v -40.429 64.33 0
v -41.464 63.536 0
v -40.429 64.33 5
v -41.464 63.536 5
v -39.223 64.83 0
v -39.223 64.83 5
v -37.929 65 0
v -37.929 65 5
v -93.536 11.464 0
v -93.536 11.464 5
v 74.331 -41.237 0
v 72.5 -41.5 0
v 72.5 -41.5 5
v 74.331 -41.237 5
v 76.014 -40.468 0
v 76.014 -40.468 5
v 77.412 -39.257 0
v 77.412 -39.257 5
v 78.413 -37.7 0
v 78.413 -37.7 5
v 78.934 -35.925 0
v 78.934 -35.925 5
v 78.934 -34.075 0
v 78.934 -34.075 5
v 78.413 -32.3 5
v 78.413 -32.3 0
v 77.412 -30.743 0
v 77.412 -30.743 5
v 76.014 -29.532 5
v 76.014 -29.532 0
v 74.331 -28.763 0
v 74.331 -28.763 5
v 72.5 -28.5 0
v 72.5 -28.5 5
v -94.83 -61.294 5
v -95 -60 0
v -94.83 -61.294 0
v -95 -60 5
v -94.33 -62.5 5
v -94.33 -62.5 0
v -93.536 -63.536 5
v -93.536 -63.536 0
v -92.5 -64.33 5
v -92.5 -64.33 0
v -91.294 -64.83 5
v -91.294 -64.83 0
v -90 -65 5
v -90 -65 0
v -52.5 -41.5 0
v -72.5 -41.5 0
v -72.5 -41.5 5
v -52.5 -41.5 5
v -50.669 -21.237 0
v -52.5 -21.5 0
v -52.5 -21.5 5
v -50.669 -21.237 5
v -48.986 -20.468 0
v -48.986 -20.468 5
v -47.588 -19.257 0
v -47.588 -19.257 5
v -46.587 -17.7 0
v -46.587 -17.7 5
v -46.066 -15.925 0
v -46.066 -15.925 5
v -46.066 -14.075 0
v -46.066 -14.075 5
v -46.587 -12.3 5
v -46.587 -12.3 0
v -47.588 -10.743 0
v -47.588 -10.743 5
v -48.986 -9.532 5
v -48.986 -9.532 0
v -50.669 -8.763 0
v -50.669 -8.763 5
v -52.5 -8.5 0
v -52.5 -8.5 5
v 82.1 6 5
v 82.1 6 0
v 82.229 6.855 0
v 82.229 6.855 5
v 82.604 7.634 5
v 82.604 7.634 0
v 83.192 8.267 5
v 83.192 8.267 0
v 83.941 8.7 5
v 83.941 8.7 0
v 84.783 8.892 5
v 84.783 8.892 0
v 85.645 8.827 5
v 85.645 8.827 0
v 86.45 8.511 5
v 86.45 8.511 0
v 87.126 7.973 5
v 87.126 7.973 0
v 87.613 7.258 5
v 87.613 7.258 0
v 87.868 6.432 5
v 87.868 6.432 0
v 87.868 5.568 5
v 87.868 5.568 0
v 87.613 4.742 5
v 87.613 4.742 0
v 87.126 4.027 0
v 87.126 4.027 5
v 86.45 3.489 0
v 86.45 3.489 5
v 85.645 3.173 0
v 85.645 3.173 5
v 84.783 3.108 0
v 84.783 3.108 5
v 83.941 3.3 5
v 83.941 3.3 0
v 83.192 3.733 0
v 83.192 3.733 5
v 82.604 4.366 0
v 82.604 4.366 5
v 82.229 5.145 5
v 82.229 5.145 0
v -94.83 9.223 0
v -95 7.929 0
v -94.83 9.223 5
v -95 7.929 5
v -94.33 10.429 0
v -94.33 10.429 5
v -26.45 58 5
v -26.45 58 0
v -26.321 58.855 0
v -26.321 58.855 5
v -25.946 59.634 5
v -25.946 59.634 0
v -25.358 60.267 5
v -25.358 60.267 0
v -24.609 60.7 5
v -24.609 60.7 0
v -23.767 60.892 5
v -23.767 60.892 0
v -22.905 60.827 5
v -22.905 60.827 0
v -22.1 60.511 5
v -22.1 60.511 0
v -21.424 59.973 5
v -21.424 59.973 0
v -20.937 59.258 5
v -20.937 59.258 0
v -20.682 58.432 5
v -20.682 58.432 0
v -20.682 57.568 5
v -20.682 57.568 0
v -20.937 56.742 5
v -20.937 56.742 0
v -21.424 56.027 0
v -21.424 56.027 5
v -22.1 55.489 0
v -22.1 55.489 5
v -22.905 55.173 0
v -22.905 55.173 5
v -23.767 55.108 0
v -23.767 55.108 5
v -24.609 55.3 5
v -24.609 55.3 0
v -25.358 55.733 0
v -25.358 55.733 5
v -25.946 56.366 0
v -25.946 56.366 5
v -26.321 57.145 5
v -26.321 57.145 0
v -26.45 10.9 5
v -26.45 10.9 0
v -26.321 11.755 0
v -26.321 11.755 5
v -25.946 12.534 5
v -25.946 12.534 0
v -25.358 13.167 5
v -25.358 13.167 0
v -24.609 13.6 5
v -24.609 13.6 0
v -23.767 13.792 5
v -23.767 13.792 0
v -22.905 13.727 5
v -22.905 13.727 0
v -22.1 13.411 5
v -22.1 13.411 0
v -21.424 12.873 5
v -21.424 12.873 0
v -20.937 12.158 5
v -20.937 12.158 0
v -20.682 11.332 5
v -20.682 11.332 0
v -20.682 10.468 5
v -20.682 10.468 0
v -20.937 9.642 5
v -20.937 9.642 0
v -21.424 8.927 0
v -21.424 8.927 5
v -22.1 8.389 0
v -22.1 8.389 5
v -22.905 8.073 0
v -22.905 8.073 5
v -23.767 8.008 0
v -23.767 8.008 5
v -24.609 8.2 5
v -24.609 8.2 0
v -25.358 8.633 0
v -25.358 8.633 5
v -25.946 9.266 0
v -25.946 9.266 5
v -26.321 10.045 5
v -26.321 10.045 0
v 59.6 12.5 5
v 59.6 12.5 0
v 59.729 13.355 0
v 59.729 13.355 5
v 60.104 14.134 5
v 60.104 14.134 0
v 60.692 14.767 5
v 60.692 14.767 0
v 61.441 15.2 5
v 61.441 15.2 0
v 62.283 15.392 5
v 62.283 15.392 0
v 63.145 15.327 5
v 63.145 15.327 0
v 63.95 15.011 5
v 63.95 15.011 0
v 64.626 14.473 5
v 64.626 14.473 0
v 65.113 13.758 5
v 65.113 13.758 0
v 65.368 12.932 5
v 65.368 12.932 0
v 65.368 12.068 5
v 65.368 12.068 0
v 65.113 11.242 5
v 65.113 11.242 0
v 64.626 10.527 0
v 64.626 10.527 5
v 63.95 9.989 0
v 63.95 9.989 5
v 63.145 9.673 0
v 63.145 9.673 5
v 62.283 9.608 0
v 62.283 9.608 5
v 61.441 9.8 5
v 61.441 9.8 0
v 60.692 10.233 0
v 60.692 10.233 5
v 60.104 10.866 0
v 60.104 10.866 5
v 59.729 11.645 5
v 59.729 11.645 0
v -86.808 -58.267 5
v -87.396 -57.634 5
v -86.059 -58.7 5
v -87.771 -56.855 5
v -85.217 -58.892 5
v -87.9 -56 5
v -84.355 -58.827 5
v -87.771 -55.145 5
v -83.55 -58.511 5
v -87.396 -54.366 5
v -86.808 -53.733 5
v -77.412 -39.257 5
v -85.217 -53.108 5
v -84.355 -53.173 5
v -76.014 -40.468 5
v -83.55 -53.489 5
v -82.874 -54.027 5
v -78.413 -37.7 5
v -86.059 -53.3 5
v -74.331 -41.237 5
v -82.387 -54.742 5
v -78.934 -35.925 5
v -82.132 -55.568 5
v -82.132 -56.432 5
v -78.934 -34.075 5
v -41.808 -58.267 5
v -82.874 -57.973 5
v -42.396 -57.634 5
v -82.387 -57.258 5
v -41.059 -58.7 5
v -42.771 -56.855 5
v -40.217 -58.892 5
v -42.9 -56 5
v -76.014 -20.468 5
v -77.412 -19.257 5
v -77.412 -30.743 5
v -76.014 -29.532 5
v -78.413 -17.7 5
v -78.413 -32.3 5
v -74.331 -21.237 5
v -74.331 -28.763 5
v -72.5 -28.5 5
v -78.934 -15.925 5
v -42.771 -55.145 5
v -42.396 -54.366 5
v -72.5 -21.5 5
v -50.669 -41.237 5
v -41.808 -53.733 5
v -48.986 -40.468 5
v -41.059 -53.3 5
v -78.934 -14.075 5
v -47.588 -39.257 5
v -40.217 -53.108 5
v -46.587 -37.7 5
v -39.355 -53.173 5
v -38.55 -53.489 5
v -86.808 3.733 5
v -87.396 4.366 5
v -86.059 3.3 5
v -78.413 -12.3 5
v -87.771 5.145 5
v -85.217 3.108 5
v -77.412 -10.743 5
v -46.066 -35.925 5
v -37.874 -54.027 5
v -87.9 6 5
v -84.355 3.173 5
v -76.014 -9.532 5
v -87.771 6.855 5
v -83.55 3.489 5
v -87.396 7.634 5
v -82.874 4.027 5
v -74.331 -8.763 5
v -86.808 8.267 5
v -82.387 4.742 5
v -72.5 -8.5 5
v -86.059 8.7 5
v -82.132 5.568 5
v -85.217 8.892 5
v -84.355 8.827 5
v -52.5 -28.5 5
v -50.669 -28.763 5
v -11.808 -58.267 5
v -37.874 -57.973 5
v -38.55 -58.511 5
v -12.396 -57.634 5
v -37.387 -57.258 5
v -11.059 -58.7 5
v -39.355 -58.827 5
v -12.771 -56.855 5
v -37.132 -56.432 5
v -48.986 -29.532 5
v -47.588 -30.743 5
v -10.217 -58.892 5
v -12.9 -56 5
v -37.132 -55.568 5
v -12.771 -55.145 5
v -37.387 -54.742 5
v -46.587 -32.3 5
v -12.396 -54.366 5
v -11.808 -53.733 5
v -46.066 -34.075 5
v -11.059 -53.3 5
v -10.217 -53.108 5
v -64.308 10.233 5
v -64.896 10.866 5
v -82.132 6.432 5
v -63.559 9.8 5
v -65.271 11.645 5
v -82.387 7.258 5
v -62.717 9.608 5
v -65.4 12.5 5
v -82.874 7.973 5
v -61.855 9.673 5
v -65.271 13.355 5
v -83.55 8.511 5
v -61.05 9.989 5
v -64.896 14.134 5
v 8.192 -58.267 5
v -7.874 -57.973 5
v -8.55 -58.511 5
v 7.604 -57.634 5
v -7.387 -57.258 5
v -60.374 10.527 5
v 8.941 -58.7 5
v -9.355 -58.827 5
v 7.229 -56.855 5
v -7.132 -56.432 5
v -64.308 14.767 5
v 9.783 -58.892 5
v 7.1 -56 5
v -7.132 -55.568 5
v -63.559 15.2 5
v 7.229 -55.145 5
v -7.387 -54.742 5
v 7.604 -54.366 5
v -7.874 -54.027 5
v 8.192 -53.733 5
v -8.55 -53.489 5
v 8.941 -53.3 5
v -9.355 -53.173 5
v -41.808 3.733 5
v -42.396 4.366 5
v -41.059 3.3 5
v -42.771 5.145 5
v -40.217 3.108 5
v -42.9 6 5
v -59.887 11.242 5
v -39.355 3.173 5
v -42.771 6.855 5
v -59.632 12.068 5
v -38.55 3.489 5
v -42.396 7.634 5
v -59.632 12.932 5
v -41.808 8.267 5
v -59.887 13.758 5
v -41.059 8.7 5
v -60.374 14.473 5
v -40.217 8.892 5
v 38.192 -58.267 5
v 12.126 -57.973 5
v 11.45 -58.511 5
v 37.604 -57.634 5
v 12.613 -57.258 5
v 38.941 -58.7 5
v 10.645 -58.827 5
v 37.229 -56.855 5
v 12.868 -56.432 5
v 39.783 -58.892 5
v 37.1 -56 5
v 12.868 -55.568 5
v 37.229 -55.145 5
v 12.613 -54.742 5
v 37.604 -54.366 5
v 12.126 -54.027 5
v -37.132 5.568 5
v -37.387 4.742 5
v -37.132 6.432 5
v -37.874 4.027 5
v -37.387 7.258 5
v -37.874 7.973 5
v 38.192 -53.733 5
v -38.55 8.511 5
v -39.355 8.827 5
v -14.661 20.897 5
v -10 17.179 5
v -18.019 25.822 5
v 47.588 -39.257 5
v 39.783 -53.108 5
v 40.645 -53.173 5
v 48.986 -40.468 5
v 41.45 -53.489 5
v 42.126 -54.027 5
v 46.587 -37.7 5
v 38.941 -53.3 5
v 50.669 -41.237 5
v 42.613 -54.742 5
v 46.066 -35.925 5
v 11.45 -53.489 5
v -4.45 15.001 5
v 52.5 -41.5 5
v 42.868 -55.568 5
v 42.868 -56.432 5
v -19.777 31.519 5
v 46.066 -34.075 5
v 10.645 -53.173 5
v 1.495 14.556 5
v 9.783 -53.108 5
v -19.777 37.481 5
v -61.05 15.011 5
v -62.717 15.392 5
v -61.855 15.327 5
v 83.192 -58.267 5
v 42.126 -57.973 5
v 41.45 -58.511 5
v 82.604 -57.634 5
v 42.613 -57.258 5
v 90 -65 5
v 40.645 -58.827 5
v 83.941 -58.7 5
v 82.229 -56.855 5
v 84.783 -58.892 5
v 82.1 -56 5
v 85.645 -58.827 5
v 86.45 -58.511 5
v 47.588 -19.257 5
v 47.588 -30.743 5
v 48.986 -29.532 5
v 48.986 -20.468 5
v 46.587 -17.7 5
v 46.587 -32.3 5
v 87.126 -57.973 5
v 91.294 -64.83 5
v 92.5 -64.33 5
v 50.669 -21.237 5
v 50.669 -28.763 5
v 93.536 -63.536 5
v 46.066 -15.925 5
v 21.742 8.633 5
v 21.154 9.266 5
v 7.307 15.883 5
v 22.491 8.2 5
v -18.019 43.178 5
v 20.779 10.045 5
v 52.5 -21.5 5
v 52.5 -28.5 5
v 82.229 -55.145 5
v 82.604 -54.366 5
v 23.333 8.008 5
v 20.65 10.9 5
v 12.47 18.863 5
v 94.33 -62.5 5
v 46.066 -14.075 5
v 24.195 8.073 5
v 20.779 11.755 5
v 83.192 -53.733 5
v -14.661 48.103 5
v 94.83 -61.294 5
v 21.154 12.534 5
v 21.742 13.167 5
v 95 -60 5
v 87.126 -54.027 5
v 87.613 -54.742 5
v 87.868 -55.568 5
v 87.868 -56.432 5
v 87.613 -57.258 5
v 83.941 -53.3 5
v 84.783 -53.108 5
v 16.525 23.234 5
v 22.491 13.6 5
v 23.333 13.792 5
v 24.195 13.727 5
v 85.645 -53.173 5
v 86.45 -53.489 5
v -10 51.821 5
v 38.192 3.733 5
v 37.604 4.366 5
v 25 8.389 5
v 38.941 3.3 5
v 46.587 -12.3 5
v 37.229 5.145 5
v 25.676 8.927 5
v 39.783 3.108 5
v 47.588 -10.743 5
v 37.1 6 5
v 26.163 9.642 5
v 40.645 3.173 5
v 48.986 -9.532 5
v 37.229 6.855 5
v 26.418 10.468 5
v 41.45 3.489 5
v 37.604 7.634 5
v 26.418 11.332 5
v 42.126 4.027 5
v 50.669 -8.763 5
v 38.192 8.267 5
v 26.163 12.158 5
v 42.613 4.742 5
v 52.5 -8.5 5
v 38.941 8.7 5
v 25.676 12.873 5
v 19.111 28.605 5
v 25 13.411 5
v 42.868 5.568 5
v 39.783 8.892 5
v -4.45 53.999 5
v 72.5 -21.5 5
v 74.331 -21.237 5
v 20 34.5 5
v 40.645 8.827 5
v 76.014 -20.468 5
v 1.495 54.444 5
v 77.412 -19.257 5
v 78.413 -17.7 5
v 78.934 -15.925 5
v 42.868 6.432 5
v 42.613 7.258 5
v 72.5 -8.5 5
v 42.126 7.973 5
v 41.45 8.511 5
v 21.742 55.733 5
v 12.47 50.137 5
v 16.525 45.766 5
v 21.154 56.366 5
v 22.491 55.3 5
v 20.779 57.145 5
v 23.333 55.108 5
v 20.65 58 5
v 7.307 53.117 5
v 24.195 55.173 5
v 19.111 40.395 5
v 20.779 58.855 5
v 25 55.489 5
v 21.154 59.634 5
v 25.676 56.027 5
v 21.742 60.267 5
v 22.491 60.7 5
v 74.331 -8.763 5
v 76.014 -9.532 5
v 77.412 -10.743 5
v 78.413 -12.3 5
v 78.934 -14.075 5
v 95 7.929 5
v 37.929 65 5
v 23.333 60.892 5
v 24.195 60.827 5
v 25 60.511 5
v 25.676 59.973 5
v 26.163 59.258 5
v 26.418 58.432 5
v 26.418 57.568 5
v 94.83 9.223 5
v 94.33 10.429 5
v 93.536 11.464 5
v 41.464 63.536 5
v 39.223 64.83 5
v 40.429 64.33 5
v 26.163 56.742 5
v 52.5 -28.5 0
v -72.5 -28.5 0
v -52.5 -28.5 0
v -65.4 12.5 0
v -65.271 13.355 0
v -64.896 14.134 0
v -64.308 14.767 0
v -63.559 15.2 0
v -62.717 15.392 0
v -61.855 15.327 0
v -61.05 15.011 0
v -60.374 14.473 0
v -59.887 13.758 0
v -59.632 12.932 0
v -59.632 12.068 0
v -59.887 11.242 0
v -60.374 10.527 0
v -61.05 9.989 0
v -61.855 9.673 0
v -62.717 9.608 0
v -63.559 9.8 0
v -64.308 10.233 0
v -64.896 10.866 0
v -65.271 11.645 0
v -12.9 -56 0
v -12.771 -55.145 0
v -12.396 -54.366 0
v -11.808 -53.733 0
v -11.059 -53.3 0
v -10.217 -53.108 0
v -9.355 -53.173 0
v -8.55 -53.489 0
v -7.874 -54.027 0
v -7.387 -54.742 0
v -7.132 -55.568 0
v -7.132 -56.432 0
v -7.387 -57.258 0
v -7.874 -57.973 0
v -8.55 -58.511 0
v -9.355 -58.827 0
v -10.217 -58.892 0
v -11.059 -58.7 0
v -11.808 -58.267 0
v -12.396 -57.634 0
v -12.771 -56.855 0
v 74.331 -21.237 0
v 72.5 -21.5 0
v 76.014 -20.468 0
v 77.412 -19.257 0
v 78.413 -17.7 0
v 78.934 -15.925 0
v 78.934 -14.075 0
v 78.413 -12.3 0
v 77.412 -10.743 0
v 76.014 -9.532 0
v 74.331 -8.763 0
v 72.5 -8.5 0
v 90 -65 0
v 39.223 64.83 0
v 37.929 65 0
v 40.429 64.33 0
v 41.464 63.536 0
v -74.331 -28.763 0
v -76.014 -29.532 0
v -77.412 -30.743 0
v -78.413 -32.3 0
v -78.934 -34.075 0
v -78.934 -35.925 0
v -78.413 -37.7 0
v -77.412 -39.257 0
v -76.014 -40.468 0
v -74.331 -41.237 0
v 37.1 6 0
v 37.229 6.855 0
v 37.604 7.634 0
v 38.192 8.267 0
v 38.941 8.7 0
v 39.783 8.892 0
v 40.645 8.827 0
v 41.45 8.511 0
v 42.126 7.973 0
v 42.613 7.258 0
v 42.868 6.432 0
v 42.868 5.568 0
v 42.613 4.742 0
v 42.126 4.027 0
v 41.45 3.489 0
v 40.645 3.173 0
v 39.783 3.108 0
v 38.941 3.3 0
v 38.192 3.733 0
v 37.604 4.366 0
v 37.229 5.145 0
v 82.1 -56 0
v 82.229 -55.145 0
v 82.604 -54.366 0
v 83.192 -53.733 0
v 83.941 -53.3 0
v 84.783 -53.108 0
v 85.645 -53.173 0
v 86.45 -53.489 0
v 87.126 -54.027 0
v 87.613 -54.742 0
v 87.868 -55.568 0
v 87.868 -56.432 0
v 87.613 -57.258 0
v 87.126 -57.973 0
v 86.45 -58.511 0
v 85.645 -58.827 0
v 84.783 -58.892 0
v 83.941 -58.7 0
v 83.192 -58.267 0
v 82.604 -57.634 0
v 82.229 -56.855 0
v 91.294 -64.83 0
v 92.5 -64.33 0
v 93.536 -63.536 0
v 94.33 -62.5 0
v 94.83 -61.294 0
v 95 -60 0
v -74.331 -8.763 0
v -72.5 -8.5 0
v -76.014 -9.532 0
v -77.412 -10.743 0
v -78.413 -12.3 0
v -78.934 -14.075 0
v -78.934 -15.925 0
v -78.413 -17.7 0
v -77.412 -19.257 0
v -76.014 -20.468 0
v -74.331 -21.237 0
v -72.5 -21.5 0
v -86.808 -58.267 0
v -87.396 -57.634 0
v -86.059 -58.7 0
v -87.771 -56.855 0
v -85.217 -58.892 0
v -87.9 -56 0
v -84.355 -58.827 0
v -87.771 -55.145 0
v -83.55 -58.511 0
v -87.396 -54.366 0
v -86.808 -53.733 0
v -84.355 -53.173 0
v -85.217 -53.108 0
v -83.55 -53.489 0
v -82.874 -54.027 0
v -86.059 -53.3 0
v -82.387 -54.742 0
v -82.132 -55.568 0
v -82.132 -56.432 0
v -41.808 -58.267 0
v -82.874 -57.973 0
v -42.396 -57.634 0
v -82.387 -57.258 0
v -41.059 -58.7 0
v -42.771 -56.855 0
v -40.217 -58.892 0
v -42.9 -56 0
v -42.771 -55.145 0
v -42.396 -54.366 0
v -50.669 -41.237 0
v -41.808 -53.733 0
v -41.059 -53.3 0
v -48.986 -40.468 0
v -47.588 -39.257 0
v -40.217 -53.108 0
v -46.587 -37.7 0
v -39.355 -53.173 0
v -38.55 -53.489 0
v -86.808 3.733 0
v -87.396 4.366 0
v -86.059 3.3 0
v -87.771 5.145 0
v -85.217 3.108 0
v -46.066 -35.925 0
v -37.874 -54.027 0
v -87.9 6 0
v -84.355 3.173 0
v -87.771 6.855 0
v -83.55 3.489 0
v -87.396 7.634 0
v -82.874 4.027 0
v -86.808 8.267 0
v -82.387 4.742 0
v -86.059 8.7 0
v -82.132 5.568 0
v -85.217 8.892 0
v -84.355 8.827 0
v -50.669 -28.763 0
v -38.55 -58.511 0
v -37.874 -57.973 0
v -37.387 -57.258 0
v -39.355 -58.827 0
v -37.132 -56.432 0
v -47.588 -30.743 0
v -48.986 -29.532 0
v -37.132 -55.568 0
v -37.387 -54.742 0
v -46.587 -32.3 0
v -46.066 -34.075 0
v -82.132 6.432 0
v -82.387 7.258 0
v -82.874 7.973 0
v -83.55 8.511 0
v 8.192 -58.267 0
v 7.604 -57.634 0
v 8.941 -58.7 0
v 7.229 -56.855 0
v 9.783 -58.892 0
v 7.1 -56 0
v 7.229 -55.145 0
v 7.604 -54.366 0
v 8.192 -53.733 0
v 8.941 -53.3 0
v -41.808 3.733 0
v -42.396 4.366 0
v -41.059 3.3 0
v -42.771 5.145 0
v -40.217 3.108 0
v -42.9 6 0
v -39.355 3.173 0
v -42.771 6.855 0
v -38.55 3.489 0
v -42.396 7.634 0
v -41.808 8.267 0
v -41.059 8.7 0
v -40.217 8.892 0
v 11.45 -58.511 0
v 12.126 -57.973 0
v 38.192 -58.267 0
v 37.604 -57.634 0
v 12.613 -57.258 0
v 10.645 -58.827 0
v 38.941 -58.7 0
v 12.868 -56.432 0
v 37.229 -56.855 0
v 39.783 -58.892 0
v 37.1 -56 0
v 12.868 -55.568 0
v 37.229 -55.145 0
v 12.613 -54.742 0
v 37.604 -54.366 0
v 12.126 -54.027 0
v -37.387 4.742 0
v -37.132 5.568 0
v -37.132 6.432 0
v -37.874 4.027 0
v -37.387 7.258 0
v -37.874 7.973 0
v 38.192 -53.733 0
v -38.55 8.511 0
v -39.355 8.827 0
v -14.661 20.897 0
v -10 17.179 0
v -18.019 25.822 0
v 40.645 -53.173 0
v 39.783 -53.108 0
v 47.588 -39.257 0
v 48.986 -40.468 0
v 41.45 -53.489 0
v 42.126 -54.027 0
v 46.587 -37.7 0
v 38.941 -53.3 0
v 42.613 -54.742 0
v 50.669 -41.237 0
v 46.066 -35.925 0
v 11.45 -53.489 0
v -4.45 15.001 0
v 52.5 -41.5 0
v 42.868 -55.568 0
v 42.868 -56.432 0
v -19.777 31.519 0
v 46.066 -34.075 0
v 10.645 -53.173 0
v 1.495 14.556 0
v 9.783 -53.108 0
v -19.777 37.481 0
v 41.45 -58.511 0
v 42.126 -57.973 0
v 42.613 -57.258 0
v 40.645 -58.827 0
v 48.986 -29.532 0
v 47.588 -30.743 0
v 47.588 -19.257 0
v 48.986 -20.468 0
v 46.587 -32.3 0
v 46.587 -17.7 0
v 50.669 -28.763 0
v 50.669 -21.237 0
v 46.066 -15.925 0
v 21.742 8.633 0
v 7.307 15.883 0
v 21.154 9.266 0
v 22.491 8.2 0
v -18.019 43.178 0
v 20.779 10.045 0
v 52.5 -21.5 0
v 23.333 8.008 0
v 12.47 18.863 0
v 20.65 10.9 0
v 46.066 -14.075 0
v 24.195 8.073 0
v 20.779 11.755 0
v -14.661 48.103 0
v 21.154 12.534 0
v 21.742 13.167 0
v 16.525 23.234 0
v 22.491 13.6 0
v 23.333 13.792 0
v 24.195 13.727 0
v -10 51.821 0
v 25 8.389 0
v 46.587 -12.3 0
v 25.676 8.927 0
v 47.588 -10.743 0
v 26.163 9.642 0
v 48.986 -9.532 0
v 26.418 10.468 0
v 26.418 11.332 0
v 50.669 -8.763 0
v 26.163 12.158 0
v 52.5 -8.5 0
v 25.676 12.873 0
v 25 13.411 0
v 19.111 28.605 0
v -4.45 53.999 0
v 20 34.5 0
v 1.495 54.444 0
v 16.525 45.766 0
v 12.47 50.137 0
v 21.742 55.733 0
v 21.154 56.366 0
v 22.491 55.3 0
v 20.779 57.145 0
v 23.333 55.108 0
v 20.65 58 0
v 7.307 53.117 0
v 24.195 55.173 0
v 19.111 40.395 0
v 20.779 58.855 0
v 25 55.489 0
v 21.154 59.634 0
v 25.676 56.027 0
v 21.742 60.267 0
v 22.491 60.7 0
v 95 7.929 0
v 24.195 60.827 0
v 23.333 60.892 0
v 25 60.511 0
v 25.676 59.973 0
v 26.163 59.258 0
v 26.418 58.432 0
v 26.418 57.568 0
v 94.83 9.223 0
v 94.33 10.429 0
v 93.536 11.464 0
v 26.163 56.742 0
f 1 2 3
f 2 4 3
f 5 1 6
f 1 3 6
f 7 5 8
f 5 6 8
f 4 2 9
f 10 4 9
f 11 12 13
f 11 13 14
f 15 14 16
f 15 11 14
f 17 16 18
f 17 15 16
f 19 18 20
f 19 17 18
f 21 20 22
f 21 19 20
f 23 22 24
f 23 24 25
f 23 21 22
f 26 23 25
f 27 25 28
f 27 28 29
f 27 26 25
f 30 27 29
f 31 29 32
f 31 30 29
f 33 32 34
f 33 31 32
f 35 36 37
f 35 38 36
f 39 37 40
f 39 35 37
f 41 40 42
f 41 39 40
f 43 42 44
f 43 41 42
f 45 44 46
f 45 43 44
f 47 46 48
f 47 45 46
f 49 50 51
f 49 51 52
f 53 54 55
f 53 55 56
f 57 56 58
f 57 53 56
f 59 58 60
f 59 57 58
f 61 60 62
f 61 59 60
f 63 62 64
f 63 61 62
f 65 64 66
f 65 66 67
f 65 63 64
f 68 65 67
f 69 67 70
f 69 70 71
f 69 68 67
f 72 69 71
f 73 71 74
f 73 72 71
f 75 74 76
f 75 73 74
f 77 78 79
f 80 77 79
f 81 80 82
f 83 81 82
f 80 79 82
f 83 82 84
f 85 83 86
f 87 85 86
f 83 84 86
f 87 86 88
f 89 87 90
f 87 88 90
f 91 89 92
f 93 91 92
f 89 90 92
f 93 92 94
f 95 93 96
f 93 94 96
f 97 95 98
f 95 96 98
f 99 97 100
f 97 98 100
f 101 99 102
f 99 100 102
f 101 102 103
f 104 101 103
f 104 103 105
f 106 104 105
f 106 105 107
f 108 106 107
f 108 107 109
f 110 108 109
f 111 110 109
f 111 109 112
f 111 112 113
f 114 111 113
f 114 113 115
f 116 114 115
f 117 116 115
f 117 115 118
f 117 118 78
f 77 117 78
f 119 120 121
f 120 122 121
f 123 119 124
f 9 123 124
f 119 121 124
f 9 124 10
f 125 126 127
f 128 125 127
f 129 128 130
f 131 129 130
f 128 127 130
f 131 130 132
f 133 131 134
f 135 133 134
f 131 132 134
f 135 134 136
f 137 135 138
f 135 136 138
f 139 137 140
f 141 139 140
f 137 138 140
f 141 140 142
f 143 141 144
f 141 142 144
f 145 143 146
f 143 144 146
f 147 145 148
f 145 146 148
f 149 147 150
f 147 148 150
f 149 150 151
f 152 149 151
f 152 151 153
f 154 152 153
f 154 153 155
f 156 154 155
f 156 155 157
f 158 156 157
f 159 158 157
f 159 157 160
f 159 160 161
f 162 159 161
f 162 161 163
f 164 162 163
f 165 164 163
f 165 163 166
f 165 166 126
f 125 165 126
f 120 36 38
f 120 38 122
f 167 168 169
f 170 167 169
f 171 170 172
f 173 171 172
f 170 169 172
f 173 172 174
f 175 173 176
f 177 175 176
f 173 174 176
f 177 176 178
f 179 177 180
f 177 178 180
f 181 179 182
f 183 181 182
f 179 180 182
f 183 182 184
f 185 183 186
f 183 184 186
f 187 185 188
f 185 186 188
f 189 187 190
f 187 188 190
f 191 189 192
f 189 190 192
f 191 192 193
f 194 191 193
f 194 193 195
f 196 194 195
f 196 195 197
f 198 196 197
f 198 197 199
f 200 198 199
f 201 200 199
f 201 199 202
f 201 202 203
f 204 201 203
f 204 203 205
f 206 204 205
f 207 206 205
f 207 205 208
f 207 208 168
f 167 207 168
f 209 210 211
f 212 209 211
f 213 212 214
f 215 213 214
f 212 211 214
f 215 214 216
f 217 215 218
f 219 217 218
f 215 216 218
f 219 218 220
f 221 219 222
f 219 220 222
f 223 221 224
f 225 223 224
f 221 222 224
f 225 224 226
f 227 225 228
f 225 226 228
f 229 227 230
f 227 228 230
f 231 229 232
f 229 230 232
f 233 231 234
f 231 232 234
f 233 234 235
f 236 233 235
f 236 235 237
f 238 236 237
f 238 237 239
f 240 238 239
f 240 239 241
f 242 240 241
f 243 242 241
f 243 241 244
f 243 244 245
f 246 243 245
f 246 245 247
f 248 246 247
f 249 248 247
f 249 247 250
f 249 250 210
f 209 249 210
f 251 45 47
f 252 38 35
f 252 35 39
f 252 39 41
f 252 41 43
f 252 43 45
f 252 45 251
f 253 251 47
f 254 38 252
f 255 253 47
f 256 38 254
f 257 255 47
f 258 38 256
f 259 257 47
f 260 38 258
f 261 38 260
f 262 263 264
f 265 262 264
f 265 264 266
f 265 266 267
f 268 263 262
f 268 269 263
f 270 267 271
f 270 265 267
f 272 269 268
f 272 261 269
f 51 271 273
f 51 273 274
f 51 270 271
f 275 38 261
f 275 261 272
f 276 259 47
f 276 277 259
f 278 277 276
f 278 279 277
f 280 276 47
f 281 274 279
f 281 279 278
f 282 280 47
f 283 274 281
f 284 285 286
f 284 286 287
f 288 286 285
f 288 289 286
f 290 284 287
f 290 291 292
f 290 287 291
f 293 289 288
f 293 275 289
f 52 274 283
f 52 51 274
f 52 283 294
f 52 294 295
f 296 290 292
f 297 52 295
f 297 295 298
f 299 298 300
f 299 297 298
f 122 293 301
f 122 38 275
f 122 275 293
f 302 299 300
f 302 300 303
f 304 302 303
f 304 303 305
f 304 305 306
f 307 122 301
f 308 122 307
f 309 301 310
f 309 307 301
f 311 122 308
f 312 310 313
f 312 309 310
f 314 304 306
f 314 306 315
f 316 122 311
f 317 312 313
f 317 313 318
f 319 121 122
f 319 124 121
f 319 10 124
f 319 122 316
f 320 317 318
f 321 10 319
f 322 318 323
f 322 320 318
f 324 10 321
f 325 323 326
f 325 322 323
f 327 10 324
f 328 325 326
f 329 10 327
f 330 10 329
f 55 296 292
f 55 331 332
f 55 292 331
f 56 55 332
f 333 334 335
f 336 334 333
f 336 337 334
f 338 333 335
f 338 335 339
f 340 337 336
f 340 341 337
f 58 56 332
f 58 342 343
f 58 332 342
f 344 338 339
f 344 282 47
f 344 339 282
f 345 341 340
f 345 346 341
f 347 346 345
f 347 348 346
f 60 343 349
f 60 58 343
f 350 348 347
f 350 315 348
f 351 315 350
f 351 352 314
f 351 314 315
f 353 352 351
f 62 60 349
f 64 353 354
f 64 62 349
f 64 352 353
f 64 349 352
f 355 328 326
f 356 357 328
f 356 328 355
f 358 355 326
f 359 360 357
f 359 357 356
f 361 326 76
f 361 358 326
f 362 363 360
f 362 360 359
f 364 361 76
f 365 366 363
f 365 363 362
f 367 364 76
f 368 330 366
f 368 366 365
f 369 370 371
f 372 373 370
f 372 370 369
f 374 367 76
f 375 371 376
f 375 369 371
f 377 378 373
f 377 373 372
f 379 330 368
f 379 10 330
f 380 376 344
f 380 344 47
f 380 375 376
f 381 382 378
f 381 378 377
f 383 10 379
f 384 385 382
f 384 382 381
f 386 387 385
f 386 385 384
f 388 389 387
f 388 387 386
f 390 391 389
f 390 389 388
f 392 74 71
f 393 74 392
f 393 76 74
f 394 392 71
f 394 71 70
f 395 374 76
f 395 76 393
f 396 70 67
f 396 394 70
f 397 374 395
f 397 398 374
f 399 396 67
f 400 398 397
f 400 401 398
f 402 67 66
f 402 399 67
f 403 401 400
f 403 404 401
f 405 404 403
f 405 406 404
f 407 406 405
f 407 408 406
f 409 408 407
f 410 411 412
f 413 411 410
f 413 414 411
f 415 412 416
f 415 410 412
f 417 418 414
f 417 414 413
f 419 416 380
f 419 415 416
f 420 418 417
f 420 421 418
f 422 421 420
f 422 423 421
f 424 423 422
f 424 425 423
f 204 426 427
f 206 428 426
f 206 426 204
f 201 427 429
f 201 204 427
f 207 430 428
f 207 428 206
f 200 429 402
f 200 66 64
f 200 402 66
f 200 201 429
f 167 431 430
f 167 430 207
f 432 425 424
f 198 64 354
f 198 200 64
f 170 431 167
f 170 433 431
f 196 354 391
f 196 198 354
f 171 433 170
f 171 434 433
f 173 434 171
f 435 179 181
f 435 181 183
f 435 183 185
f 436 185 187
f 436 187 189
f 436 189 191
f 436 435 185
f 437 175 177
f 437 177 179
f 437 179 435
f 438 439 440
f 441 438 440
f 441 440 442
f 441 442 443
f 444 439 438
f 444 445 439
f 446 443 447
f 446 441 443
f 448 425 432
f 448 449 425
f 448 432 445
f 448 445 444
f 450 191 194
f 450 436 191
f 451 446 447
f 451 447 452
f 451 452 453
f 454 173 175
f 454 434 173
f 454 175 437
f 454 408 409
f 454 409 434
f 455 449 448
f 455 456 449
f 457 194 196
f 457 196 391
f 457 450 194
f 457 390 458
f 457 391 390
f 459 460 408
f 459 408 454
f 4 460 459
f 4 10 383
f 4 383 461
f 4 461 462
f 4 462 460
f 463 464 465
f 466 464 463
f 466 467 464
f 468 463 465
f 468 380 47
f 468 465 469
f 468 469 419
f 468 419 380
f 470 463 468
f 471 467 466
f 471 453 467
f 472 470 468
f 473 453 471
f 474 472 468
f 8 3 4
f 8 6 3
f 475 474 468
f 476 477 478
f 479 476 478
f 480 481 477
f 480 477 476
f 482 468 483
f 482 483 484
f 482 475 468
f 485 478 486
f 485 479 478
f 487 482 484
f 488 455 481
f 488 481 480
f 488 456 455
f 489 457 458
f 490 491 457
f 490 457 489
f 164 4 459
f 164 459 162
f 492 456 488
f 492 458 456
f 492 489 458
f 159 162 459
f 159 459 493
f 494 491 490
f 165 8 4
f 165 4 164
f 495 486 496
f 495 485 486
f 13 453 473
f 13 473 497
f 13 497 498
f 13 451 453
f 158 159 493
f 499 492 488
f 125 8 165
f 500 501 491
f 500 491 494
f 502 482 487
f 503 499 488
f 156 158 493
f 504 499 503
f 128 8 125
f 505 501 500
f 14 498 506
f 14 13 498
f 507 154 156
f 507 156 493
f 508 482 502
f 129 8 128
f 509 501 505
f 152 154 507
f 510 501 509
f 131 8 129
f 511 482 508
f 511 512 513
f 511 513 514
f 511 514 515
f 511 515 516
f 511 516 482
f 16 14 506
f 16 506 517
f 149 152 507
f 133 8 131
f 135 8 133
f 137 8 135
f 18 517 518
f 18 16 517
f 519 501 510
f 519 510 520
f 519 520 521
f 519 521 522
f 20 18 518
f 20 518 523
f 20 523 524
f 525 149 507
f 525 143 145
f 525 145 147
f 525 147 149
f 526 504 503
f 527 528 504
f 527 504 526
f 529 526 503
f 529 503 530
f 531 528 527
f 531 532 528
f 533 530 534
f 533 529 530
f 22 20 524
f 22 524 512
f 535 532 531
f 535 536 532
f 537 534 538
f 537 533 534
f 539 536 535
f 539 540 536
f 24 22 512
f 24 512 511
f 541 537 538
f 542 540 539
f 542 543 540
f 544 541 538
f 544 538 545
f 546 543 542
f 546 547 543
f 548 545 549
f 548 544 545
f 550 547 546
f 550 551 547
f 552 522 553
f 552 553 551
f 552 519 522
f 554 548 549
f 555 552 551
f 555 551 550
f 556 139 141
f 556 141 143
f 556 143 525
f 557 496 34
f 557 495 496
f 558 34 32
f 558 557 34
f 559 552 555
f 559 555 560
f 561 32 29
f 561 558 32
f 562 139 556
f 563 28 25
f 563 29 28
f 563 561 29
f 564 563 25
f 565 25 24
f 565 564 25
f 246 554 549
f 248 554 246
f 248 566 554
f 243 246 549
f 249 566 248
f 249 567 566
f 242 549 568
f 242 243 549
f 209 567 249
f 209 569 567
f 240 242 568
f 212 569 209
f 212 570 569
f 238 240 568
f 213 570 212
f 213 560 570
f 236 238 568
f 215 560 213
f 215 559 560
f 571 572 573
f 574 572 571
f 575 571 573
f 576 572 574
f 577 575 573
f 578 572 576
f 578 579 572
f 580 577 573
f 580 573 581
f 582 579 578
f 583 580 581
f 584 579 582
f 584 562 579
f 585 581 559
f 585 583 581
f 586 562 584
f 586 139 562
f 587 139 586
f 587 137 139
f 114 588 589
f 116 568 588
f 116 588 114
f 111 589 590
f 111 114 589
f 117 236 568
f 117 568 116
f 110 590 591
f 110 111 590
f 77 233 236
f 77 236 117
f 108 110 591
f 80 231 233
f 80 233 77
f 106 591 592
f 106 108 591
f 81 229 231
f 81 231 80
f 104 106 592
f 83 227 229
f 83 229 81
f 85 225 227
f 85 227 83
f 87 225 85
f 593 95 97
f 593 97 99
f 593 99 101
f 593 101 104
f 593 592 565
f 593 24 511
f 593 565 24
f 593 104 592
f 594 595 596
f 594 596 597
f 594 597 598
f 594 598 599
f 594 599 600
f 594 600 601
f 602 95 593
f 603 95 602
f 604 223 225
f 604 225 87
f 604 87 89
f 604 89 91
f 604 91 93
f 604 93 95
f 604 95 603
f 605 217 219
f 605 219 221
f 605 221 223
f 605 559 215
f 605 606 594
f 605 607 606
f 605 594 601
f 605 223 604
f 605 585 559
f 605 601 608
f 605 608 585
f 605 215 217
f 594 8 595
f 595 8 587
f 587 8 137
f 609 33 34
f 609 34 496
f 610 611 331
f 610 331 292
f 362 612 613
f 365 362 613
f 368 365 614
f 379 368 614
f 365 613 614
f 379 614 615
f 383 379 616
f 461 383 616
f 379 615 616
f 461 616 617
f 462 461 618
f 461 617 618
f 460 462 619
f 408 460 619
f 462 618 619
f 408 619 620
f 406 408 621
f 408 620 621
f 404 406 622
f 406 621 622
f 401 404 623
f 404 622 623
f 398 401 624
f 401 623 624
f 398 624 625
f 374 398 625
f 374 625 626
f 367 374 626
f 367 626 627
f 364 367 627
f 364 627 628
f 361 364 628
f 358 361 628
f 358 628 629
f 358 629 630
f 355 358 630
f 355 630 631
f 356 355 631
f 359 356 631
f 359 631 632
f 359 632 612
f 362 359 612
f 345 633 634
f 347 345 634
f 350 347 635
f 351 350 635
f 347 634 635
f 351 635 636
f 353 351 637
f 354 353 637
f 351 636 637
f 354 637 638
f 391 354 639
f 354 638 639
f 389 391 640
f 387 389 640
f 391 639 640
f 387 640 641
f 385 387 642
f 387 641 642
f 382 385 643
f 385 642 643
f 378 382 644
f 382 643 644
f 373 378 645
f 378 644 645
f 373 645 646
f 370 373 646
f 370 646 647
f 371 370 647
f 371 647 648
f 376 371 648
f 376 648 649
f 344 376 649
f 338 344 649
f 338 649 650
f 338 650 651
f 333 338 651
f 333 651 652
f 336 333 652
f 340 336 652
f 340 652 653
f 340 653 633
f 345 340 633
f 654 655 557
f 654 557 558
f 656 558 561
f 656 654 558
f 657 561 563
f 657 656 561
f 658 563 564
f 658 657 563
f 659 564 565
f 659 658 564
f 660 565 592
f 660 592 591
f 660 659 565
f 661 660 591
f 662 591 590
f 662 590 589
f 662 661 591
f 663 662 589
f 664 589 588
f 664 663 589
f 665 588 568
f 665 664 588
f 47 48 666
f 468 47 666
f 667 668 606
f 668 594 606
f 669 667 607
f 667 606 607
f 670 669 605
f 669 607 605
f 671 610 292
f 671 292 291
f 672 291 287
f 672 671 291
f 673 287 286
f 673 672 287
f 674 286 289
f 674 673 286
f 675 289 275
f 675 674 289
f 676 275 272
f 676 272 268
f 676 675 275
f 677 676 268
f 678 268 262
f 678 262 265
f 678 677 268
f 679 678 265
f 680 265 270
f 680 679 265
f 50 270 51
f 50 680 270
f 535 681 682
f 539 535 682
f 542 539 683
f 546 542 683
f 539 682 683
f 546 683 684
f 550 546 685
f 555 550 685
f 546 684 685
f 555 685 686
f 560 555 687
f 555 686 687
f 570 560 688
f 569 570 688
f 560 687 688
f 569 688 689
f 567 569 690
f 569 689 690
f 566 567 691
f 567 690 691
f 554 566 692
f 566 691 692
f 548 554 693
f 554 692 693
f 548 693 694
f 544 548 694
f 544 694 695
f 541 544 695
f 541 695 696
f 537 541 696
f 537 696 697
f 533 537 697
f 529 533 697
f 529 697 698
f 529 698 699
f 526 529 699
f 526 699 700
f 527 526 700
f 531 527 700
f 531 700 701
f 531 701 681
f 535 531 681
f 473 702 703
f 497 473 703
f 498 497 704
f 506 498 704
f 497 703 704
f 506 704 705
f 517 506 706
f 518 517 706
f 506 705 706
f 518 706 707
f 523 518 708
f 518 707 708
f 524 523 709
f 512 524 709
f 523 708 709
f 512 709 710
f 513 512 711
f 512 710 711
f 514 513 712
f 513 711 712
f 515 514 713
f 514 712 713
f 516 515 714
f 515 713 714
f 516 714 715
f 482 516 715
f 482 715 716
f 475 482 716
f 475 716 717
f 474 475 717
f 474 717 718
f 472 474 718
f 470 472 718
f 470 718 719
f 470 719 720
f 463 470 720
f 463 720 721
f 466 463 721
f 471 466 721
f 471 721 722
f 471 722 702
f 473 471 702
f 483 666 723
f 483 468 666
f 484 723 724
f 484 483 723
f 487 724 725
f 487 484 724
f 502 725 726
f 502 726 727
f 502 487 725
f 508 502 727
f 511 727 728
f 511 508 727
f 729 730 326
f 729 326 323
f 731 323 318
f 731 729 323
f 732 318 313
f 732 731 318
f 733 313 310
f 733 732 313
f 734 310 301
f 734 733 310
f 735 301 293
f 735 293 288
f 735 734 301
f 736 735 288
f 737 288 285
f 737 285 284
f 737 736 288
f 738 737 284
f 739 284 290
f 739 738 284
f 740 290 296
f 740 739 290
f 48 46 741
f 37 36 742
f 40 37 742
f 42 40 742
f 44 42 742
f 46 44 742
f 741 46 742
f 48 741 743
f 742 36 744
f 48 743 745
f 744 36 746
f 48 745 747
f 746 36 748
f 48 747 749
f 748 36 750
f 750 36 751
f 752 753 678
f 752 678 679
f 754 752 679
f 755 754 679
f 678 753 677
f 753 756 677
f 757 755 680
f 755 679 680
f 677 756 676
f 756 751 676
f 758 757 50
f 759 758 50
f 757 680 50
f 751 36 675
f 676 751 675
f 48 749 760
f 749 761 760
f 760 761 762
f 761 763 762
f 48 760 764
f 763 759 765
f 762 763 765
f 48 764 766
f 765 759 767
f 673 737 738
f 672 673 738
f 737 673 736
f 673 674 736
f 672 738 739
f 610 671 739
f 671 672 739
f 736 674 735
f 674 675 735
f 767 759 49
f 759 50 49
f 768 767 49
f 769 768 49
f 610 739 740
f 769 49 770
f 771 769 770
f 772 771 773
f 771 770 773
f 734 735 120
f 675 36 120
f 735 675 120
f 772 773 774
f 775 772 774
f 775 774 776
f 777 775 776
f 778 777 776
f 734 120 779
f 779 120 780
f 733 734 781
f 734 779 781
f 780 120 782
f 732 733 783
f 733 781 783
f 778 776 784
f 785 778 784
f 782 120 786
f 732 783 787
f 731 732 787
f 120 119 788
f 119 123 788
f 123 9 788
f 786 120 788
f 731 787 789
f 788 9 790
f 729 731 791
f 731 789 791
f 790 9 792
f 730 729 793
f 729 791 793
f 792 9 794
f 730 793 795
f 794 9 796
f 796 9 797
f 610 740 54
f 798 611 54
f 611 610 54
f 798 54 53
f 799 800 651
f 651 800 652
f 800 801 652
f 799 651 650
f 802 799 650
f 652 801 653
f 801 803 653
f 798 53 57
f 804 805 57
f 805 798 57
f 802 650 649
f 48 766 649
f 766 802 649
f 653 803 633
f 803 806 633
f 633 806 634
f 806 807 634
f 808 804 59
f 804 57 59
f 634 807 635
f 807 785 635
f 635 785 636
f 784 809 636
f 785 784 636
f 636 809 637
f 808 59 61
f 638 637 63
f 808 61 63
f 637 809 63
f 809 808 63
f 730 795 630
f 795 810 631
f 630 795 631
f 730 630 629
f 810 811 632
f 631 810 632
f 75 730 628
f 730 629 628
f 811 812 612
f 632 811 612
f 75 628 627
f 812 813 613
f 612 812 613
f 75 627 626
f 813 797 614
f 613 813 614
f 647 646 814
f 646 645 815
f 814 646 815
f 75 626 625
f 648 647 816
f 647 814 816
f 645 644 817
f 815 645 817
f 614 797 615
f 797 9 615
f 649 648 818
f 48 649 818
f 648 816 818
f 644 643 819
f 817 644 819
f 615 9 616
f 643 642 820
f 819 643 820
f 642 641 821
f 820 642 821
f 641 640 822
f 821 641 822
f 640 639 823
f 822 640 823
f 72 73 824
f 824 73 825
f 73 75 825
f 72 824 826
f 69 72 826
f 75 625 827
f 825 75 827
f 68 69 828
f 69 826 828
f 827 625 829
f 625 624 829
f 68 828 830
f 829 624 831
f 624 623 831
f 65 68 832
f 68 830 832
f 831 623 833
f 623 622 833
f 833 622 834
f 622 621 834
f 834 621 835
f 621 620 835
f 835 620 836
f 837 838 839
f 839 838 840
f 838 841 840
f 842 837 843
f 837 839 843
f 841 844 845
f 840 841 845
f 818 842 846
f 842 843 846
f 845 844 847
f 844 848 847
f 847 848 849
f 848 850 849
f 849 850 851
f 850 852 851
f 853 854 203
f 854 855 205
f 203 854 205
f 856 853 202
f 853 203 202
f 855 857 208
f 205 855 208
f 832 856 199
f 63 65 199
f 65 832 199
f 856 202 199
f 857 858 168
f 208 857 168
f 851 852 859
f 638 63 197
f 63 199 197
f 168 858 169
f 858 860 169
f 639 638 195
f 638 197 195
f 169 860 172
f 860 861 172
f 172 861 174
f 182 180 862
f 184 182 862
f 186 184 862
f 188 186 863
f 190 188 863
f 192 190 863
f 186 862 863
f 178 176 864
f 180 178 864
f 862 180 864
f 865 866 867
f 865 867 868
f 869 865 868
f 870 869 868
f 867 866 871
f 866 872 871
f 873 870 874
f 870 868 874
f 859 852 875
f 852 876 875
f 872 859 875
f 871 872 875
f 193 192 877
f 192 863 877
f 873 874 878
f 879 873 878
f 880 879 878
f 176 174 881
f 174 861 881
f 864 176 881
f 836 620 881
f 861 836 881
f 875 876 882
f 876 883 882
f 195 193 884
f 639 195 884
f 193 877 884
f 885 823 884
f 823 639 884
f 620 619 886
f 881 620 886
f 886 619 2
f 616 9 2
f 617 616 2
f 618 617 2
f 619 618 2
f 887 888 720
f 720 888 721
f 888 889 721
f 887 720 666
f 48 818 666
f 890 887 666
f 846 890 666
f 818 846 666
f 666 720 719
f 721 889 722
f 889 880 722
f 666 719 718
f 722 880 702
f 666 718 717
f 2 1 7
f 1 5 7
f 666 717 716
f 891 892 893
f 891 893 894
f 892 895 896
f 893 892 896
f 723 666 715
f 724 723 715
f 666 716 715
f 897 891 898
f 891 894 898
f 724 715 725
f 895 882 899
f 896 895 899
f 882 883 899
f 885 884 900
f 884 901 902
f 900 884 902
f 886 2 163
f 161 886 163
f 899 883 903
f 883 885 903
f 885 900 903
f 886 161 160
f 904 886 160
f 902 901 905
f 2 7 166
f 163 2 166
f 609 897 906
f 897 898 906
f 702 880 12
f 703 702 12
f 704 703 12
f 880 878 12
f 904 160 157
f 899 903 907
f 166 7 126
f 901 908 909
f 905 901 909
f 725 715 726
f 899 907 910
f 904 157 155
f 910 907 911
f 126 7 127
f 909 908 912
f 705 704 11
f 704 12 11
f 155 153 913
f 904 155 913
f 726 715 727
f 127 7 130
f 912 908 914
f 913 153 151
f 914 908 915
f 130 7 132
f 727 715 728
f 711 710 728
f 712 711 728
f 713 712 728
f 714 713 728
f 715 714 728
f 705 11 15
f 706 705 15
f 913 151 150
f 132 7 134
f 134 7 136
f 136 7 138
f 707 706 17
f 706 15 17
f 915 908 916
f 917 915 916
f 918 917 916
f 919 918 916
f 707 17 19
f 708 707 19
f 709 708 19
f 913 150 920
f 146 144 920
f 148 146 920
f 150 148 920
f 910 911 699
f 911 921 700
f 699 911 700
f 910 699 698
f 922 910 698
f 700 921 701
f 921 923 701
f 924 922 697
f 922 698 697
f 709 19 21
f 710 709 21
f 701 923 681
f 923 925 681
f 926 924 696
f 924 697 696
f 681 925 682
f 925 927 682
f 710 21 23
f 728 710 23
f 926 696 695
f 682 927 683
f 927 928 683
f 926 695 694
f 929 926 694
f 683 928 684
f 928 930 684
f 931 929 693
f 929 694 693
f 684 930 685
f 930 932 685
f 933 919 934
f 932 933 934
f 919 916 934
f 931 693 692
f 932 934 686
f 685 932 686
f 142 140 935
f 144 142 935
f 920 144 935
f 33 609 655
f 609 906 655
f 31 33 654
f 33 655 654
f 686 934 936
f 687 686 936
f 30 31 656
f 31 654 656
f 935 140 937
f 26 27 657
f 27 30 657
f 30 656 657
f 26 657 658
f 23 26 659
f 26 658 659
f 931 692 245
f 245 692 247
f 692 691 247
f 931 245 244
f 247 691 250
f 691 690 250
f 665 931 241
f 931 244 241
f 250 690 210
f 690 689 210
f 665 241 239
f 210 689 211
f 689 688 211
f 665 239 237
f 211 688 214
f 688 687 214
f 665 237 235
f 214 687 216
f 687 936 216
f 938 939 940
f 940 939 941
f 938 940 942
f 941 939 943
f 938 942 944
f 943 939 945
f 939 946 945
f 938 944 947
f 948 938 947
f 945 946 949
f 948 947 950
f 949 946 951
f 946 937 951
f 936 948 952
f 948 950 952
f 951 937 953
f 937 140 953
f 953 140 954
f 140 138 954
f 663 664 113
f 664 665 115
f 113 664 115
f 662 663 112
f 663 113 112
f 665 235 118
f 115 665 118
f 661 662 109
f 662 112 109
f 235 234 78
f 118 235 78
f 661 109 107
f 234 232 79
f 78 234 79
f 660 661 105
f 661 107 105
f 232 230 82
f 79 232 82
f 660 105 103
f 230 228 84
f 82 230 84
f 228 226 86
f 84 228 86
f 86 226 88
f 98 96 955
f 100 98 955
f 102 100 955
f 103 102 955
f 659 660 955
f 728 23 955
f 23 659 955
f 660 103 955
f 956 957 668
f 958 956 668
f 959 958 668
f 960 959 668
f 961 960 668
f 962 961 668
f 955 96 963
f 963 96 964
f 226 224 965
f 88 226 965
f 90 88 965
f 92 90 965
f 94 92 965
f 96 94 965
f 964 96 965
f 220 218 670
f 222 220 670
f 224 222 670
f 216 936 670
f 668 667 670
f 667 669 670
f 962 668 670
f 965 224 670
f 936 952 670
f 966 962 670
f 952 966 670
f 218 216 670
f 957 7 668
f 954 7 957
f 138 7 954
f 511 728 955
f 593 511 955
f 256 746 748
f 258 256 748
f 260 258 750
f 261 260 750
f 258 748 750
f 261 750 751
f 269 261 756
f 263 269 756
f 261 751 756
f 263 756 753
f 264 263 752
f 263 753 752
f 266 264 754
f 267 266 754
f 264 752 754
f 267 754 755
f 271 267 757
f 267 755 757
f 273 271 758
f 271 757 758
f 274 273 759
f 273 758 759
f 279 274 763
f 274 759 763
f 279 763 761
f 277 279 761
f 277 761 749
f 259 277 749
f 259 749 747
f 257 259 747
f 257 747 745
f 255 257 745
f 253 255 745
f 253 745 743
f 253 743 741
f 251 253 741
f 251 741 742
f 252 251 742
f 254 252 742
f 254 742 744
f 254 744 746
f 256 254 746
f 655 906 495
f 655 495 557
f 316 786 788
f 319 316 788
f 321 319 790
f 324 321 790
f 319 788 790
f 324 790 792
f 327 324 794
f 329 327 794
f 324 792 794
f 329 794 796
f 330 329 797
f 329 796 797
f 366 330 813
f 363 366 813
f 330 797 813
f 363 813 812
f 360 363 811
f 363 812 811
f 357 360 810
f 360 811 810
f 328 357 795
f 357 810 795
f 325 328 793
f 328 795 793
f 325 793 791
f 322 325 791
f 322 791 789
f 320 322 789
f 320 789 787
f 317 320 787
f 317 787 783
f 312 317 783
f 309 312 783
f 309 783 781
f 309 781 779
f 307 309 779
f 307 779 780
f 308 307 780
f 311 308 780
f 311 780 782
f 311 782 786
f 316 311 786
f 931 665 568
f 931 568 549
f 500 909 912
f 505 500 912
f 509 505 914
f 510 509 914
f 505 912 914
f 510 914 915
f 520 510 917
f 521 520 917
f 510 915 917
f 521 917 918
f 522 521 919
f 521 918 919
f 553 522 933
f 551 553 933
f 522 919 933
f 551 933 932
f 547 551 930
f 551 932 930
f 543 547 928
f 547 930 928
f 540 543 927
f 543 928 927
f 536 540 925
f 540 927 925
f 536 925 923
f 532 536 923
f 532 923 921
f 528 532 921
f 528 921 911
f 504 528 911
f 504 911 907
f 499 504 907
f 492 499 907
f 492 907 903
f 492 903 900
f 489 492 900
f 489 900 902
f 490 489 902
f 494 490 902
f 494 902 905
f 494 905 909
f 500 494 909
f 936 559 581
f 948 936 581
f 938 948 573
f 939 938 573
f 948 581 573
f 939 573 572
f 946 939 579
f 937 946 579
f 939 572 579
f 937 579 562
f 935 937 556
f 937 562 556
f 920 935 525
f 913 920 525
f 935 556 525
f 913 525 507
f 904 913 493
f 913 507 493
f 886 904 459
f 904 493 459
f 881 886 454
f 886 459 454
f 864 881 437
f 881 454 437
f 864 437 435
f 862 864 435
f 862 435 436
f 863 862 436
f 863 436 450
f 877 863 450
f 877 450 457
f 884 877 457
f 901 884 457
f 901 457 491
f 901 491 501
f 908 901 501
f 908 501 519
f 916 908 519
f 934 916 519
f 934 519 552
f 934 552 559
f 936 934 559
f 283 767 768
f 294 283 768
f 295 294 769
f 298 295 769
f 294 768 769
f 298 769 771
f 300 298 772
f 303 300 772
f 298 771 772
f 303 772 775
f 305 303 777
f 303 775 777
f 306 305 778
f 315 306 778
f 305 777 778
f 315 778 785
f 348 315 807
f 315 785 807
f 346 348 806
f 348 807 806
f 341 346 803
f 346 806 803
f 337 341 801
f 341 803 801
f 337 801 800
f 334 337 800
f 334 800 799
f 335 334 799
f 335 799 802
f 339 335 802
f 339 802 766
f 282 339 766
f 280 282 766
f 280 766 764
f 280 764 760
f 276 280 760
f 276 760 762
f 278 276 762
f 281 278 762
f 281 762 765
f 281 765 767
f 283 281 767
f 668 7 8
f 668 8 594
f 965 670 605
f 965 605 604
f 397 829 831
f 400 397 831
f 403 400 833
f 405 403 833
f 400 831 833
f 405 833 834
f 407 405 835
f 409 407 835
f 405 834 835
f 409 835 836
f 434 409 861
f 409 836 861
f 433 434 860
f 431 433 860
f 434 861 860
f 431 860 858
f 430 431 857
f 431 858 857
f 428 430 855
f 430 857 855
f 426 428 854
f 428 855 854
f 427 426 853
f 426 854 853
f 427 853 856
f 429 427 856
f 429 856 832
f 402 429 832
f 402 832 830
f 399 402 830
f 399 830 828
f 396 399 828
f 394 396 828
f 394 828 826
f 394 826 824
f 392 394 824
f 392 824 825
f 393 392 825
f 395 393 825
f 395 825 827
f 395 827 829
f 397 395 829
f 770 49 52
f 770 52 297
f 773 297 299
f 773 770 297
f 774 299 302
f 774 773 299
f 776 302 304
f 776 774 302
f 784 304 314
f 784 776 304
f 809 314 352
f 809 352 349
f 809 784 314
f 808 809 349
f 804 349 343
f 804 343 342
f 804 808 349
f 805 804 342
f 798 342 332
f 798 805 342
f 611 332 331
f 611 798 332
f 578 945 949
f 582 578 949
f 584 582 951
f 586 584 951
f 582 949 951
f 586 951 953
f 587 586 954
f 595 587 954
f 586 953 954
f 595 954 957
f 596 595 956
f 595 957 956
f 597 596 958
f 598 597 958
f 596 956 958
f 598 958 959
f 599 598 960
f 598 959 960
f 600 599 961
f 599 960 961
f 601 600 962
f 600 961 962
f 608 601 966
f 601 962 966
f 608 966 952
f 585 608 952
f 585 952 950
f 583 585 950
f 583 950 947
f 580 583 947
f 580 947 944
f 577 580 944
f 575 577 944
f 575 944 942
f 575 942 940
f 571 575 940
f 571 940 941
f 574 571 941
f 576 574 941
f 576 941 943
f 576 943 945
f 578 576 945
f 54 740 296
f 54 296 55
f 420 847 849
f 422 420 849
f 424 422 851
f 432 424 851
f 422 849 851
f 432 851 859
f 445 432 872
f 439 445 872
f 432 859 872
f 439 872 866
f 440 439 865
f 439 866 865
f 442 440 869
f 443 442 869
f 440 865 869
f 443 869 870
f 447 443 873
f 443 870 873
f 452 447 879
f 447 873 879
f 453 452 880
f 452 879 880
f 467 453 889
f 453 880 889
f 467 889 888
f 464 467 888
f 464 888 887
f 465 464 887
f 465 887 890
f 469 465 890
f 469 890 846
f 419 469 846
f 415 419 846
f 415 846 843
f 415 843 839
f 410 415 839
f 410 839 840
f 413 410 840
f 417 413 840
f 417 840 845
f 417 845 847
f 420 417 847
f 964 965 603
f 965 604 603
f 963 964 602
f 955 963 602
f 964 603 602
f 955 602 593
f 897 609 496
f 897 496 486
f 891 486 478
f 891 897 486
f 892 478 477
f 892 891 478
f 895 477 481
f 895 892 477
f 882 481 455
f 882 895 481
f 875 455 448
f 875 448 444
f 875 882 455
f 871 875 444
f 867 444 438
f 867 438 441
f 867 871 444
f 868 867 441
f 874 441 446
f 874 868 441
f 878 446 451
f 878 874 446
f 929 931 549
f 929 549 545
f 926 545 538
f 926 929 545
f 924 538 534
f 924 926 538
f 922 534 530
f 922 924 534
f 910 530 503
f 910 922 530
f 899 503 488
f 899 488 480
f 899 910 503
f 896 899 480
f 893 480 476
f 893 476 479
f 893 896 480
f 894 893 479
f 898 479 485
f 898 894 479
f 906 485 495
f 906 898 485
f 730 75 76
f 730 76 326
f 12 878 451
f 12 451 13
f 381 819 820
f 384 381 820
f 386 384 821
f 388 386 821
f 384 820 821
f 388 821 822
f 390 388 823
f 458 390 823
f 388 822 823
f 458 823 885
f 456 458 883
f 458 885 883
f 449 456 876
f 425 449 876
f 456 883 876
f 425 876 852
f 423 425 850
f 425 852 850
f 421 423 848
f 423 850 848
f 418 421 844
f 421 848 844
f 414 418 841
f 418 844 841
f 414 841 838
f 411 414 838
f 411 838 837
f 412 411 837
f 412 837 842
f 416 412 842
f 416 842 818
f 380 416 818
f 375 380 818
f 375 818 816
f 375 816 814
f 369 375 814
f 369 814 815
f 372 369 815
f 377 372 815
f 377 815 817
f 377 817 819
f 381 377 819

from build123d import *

# Parameters (mm, degrees)
SKETCH1_W                      = 190
SKETCH1_H                      = 130
BOSS_EXTRUDE1_DEPTH            = 5
M5_CLEARANCE_HOLE1_D           = 5.8
SKETCH6_R                      = 20
CUT_EXTRUDE1_DEPTH             = 10
F_13_0_13_DIAMETER_SLOT1_DEPTH = 5
CUT_EXTRUDE2_REACH             = 117.217
FILLET1_R                      = 5
M5_CLEARANCE_HOLE2_D           = 5.8


# Read off the part's stored shape, not the designer's step: Ø13.0 (13) Diameter Slot1
with BuildPart() as part:
    # Sketch1 → Boss-Extrude1 (new body)
    with BuildSketch(Plane.XY):
        Rectangle(SKETCH1_W, SKETCH1_H)
    extrude(amount=BOSS_EXTRUDE1_DEPTH)

    # M5 Clearance Hole1 (through all)
    with Locations(Plane.XY.offset(5)):
        with Locations((-40, 6), (40, 6), (-40, -56), (40, -56), (-23.55, 58), (23.55, 58), (-23.55, 10.9), (23.55, 10.9), (-10, -56), (10, -56), (-85, 6), (85, 6), (-85, -56), (85, -56)):
            Hole(M5_CLEARANCE_HOLE1_D / 2)

    # Sketch6 → Cut-Extrude1 (cut)
    with BuildSketch(Plane.XY.offset(5)):
        with Locations((0, 34.5)):
            Circle(SKETCH6_R)
    extrude(amount=-CUT_EXTRUDE1_DEPTH, mode=Mode.SUBTRACT)

    # Ø13.0 (13) Diameter Slot1 outline → Ø13.0 (13) Diameter Slot1 (cut)
    with BuildSketch(Plane.XY):
        with BuildLine():
            ThreePointArc((-52.5, -41.5), (-46, -35), (-52.5, -28.5))
            Line((-52.5, -28.5), (-72.5, -28.5))
            ThreePointArc((-72.5, -28.5), (-79, -35), (-72.5, -41.5))
            Line((-72.5, -41.5), (-52.5, -41.5))
        make_face()
        with BuildLine():
            ThreePointArc((52.5, -28.5), (46, -35), (52.5, -41.5))
            Line((52.5, -41.5), (72.5, -41.5))
            ThreePointArc((72.5, -41.5), (79, -35), (72.5, -28.5))
            Line((72.5, -28.5), (52.5, -28.5))
        make_face()
        with BuildLine():
            ThreePointArc((-52.5, -21.5), (-46, -15), (-52.5, -8.5))
            Line((-52.5, -8.5), (-72.5, -8.5))
            ThreePointArc((-72.5, -8.5), (-79, -15), (-72.5, -21.5))
            Line((-72.5, -21.5), (-52.5, -21.5))
        make_face()
        with BuildLine():
            ThreePointArc((52.5, -8.5), (46, -15), (52.5, -21.5))
            Line((52.5, -21.5), (72.5, -21.5))
            ThreePointArc((72.5, -21.5), (79, -15), (72.5, -8.5))
            Line((72.5, -8.5), (52.5, -8.5))
        make_face()
    extrude(amount=F_13_0_13_DIAMETER_SLOT1_DEPTH, mode=Mode.SUBTRACT)

    # Sketch14 → Cut-Extrude2 (cut, up to next)
    with BuildSketch(Plane(origin=(0, 0, 0), x_dir=(-1, 0, 0), z_dir=(0, 0, -1)), mode=Mode.PRIVATE) as cut_extrude2_sk1:
        Polygon((-40, 65), (-95, 10), (-95, 65), align=None)
    cut_extrude2_tool1 = extrude(cut_extrude2_sk1.sketch, amount=-CUT_EXTRUDE2_REACH, mode=Mode.PRIVATE) & part.part
    # Sketch14 → Cut-Extrude2 (cut, up to next)
    with BuildSketch(Plane(origin=(0, 0, 0), x_dir=(-1, 0, 0), z_dir=(0, 0, -1)), mode=Mode.PRIVATE) as cut_extrude2_sk2:
        Polygon((40, 65), (95, 10), (95, 65), align=None)
    cut_extrude2_tool2 = extrude(cut_extrude2_sk2.sketch, amount=-CUT_EXTRUDE2_REACH, mode=Mode.PRIVATE) & part.part
    add(cut_extrude2_tool1.solids().sort_by_distance((76.666667, 46.666667, 0))[0], mode=Mode.SUBTRACT)
    add(cut_extrude2_tool2.solids().sort_by_distance((-76.666667, 46.666667, 0))[0], mode=Mode.SUBTRACT)

    # Fillet1
    fillet1_edges = [part.edges().sort_by_distance(p)[0] for p in [
        (40, 65, 2.5),
        (95, 10, 2.5),
        (-40, 65, 2.5),
        (-95, 10, 2.5),
        (95, -65, 2.5),
        (-95, -65, 2.5),
    ]]
    fillet(fillet1_edges, radius=FILLET1_R)

    # M5 Clearance Hole2 (through all)
    with Locations(Plane.XY.offset(5)):
        with Locations((62.5, 12.5), (-62.5, 12.5)):
            Hole(M5_CLEARANCE_HOLE2_D / 2)


solid = part.part
